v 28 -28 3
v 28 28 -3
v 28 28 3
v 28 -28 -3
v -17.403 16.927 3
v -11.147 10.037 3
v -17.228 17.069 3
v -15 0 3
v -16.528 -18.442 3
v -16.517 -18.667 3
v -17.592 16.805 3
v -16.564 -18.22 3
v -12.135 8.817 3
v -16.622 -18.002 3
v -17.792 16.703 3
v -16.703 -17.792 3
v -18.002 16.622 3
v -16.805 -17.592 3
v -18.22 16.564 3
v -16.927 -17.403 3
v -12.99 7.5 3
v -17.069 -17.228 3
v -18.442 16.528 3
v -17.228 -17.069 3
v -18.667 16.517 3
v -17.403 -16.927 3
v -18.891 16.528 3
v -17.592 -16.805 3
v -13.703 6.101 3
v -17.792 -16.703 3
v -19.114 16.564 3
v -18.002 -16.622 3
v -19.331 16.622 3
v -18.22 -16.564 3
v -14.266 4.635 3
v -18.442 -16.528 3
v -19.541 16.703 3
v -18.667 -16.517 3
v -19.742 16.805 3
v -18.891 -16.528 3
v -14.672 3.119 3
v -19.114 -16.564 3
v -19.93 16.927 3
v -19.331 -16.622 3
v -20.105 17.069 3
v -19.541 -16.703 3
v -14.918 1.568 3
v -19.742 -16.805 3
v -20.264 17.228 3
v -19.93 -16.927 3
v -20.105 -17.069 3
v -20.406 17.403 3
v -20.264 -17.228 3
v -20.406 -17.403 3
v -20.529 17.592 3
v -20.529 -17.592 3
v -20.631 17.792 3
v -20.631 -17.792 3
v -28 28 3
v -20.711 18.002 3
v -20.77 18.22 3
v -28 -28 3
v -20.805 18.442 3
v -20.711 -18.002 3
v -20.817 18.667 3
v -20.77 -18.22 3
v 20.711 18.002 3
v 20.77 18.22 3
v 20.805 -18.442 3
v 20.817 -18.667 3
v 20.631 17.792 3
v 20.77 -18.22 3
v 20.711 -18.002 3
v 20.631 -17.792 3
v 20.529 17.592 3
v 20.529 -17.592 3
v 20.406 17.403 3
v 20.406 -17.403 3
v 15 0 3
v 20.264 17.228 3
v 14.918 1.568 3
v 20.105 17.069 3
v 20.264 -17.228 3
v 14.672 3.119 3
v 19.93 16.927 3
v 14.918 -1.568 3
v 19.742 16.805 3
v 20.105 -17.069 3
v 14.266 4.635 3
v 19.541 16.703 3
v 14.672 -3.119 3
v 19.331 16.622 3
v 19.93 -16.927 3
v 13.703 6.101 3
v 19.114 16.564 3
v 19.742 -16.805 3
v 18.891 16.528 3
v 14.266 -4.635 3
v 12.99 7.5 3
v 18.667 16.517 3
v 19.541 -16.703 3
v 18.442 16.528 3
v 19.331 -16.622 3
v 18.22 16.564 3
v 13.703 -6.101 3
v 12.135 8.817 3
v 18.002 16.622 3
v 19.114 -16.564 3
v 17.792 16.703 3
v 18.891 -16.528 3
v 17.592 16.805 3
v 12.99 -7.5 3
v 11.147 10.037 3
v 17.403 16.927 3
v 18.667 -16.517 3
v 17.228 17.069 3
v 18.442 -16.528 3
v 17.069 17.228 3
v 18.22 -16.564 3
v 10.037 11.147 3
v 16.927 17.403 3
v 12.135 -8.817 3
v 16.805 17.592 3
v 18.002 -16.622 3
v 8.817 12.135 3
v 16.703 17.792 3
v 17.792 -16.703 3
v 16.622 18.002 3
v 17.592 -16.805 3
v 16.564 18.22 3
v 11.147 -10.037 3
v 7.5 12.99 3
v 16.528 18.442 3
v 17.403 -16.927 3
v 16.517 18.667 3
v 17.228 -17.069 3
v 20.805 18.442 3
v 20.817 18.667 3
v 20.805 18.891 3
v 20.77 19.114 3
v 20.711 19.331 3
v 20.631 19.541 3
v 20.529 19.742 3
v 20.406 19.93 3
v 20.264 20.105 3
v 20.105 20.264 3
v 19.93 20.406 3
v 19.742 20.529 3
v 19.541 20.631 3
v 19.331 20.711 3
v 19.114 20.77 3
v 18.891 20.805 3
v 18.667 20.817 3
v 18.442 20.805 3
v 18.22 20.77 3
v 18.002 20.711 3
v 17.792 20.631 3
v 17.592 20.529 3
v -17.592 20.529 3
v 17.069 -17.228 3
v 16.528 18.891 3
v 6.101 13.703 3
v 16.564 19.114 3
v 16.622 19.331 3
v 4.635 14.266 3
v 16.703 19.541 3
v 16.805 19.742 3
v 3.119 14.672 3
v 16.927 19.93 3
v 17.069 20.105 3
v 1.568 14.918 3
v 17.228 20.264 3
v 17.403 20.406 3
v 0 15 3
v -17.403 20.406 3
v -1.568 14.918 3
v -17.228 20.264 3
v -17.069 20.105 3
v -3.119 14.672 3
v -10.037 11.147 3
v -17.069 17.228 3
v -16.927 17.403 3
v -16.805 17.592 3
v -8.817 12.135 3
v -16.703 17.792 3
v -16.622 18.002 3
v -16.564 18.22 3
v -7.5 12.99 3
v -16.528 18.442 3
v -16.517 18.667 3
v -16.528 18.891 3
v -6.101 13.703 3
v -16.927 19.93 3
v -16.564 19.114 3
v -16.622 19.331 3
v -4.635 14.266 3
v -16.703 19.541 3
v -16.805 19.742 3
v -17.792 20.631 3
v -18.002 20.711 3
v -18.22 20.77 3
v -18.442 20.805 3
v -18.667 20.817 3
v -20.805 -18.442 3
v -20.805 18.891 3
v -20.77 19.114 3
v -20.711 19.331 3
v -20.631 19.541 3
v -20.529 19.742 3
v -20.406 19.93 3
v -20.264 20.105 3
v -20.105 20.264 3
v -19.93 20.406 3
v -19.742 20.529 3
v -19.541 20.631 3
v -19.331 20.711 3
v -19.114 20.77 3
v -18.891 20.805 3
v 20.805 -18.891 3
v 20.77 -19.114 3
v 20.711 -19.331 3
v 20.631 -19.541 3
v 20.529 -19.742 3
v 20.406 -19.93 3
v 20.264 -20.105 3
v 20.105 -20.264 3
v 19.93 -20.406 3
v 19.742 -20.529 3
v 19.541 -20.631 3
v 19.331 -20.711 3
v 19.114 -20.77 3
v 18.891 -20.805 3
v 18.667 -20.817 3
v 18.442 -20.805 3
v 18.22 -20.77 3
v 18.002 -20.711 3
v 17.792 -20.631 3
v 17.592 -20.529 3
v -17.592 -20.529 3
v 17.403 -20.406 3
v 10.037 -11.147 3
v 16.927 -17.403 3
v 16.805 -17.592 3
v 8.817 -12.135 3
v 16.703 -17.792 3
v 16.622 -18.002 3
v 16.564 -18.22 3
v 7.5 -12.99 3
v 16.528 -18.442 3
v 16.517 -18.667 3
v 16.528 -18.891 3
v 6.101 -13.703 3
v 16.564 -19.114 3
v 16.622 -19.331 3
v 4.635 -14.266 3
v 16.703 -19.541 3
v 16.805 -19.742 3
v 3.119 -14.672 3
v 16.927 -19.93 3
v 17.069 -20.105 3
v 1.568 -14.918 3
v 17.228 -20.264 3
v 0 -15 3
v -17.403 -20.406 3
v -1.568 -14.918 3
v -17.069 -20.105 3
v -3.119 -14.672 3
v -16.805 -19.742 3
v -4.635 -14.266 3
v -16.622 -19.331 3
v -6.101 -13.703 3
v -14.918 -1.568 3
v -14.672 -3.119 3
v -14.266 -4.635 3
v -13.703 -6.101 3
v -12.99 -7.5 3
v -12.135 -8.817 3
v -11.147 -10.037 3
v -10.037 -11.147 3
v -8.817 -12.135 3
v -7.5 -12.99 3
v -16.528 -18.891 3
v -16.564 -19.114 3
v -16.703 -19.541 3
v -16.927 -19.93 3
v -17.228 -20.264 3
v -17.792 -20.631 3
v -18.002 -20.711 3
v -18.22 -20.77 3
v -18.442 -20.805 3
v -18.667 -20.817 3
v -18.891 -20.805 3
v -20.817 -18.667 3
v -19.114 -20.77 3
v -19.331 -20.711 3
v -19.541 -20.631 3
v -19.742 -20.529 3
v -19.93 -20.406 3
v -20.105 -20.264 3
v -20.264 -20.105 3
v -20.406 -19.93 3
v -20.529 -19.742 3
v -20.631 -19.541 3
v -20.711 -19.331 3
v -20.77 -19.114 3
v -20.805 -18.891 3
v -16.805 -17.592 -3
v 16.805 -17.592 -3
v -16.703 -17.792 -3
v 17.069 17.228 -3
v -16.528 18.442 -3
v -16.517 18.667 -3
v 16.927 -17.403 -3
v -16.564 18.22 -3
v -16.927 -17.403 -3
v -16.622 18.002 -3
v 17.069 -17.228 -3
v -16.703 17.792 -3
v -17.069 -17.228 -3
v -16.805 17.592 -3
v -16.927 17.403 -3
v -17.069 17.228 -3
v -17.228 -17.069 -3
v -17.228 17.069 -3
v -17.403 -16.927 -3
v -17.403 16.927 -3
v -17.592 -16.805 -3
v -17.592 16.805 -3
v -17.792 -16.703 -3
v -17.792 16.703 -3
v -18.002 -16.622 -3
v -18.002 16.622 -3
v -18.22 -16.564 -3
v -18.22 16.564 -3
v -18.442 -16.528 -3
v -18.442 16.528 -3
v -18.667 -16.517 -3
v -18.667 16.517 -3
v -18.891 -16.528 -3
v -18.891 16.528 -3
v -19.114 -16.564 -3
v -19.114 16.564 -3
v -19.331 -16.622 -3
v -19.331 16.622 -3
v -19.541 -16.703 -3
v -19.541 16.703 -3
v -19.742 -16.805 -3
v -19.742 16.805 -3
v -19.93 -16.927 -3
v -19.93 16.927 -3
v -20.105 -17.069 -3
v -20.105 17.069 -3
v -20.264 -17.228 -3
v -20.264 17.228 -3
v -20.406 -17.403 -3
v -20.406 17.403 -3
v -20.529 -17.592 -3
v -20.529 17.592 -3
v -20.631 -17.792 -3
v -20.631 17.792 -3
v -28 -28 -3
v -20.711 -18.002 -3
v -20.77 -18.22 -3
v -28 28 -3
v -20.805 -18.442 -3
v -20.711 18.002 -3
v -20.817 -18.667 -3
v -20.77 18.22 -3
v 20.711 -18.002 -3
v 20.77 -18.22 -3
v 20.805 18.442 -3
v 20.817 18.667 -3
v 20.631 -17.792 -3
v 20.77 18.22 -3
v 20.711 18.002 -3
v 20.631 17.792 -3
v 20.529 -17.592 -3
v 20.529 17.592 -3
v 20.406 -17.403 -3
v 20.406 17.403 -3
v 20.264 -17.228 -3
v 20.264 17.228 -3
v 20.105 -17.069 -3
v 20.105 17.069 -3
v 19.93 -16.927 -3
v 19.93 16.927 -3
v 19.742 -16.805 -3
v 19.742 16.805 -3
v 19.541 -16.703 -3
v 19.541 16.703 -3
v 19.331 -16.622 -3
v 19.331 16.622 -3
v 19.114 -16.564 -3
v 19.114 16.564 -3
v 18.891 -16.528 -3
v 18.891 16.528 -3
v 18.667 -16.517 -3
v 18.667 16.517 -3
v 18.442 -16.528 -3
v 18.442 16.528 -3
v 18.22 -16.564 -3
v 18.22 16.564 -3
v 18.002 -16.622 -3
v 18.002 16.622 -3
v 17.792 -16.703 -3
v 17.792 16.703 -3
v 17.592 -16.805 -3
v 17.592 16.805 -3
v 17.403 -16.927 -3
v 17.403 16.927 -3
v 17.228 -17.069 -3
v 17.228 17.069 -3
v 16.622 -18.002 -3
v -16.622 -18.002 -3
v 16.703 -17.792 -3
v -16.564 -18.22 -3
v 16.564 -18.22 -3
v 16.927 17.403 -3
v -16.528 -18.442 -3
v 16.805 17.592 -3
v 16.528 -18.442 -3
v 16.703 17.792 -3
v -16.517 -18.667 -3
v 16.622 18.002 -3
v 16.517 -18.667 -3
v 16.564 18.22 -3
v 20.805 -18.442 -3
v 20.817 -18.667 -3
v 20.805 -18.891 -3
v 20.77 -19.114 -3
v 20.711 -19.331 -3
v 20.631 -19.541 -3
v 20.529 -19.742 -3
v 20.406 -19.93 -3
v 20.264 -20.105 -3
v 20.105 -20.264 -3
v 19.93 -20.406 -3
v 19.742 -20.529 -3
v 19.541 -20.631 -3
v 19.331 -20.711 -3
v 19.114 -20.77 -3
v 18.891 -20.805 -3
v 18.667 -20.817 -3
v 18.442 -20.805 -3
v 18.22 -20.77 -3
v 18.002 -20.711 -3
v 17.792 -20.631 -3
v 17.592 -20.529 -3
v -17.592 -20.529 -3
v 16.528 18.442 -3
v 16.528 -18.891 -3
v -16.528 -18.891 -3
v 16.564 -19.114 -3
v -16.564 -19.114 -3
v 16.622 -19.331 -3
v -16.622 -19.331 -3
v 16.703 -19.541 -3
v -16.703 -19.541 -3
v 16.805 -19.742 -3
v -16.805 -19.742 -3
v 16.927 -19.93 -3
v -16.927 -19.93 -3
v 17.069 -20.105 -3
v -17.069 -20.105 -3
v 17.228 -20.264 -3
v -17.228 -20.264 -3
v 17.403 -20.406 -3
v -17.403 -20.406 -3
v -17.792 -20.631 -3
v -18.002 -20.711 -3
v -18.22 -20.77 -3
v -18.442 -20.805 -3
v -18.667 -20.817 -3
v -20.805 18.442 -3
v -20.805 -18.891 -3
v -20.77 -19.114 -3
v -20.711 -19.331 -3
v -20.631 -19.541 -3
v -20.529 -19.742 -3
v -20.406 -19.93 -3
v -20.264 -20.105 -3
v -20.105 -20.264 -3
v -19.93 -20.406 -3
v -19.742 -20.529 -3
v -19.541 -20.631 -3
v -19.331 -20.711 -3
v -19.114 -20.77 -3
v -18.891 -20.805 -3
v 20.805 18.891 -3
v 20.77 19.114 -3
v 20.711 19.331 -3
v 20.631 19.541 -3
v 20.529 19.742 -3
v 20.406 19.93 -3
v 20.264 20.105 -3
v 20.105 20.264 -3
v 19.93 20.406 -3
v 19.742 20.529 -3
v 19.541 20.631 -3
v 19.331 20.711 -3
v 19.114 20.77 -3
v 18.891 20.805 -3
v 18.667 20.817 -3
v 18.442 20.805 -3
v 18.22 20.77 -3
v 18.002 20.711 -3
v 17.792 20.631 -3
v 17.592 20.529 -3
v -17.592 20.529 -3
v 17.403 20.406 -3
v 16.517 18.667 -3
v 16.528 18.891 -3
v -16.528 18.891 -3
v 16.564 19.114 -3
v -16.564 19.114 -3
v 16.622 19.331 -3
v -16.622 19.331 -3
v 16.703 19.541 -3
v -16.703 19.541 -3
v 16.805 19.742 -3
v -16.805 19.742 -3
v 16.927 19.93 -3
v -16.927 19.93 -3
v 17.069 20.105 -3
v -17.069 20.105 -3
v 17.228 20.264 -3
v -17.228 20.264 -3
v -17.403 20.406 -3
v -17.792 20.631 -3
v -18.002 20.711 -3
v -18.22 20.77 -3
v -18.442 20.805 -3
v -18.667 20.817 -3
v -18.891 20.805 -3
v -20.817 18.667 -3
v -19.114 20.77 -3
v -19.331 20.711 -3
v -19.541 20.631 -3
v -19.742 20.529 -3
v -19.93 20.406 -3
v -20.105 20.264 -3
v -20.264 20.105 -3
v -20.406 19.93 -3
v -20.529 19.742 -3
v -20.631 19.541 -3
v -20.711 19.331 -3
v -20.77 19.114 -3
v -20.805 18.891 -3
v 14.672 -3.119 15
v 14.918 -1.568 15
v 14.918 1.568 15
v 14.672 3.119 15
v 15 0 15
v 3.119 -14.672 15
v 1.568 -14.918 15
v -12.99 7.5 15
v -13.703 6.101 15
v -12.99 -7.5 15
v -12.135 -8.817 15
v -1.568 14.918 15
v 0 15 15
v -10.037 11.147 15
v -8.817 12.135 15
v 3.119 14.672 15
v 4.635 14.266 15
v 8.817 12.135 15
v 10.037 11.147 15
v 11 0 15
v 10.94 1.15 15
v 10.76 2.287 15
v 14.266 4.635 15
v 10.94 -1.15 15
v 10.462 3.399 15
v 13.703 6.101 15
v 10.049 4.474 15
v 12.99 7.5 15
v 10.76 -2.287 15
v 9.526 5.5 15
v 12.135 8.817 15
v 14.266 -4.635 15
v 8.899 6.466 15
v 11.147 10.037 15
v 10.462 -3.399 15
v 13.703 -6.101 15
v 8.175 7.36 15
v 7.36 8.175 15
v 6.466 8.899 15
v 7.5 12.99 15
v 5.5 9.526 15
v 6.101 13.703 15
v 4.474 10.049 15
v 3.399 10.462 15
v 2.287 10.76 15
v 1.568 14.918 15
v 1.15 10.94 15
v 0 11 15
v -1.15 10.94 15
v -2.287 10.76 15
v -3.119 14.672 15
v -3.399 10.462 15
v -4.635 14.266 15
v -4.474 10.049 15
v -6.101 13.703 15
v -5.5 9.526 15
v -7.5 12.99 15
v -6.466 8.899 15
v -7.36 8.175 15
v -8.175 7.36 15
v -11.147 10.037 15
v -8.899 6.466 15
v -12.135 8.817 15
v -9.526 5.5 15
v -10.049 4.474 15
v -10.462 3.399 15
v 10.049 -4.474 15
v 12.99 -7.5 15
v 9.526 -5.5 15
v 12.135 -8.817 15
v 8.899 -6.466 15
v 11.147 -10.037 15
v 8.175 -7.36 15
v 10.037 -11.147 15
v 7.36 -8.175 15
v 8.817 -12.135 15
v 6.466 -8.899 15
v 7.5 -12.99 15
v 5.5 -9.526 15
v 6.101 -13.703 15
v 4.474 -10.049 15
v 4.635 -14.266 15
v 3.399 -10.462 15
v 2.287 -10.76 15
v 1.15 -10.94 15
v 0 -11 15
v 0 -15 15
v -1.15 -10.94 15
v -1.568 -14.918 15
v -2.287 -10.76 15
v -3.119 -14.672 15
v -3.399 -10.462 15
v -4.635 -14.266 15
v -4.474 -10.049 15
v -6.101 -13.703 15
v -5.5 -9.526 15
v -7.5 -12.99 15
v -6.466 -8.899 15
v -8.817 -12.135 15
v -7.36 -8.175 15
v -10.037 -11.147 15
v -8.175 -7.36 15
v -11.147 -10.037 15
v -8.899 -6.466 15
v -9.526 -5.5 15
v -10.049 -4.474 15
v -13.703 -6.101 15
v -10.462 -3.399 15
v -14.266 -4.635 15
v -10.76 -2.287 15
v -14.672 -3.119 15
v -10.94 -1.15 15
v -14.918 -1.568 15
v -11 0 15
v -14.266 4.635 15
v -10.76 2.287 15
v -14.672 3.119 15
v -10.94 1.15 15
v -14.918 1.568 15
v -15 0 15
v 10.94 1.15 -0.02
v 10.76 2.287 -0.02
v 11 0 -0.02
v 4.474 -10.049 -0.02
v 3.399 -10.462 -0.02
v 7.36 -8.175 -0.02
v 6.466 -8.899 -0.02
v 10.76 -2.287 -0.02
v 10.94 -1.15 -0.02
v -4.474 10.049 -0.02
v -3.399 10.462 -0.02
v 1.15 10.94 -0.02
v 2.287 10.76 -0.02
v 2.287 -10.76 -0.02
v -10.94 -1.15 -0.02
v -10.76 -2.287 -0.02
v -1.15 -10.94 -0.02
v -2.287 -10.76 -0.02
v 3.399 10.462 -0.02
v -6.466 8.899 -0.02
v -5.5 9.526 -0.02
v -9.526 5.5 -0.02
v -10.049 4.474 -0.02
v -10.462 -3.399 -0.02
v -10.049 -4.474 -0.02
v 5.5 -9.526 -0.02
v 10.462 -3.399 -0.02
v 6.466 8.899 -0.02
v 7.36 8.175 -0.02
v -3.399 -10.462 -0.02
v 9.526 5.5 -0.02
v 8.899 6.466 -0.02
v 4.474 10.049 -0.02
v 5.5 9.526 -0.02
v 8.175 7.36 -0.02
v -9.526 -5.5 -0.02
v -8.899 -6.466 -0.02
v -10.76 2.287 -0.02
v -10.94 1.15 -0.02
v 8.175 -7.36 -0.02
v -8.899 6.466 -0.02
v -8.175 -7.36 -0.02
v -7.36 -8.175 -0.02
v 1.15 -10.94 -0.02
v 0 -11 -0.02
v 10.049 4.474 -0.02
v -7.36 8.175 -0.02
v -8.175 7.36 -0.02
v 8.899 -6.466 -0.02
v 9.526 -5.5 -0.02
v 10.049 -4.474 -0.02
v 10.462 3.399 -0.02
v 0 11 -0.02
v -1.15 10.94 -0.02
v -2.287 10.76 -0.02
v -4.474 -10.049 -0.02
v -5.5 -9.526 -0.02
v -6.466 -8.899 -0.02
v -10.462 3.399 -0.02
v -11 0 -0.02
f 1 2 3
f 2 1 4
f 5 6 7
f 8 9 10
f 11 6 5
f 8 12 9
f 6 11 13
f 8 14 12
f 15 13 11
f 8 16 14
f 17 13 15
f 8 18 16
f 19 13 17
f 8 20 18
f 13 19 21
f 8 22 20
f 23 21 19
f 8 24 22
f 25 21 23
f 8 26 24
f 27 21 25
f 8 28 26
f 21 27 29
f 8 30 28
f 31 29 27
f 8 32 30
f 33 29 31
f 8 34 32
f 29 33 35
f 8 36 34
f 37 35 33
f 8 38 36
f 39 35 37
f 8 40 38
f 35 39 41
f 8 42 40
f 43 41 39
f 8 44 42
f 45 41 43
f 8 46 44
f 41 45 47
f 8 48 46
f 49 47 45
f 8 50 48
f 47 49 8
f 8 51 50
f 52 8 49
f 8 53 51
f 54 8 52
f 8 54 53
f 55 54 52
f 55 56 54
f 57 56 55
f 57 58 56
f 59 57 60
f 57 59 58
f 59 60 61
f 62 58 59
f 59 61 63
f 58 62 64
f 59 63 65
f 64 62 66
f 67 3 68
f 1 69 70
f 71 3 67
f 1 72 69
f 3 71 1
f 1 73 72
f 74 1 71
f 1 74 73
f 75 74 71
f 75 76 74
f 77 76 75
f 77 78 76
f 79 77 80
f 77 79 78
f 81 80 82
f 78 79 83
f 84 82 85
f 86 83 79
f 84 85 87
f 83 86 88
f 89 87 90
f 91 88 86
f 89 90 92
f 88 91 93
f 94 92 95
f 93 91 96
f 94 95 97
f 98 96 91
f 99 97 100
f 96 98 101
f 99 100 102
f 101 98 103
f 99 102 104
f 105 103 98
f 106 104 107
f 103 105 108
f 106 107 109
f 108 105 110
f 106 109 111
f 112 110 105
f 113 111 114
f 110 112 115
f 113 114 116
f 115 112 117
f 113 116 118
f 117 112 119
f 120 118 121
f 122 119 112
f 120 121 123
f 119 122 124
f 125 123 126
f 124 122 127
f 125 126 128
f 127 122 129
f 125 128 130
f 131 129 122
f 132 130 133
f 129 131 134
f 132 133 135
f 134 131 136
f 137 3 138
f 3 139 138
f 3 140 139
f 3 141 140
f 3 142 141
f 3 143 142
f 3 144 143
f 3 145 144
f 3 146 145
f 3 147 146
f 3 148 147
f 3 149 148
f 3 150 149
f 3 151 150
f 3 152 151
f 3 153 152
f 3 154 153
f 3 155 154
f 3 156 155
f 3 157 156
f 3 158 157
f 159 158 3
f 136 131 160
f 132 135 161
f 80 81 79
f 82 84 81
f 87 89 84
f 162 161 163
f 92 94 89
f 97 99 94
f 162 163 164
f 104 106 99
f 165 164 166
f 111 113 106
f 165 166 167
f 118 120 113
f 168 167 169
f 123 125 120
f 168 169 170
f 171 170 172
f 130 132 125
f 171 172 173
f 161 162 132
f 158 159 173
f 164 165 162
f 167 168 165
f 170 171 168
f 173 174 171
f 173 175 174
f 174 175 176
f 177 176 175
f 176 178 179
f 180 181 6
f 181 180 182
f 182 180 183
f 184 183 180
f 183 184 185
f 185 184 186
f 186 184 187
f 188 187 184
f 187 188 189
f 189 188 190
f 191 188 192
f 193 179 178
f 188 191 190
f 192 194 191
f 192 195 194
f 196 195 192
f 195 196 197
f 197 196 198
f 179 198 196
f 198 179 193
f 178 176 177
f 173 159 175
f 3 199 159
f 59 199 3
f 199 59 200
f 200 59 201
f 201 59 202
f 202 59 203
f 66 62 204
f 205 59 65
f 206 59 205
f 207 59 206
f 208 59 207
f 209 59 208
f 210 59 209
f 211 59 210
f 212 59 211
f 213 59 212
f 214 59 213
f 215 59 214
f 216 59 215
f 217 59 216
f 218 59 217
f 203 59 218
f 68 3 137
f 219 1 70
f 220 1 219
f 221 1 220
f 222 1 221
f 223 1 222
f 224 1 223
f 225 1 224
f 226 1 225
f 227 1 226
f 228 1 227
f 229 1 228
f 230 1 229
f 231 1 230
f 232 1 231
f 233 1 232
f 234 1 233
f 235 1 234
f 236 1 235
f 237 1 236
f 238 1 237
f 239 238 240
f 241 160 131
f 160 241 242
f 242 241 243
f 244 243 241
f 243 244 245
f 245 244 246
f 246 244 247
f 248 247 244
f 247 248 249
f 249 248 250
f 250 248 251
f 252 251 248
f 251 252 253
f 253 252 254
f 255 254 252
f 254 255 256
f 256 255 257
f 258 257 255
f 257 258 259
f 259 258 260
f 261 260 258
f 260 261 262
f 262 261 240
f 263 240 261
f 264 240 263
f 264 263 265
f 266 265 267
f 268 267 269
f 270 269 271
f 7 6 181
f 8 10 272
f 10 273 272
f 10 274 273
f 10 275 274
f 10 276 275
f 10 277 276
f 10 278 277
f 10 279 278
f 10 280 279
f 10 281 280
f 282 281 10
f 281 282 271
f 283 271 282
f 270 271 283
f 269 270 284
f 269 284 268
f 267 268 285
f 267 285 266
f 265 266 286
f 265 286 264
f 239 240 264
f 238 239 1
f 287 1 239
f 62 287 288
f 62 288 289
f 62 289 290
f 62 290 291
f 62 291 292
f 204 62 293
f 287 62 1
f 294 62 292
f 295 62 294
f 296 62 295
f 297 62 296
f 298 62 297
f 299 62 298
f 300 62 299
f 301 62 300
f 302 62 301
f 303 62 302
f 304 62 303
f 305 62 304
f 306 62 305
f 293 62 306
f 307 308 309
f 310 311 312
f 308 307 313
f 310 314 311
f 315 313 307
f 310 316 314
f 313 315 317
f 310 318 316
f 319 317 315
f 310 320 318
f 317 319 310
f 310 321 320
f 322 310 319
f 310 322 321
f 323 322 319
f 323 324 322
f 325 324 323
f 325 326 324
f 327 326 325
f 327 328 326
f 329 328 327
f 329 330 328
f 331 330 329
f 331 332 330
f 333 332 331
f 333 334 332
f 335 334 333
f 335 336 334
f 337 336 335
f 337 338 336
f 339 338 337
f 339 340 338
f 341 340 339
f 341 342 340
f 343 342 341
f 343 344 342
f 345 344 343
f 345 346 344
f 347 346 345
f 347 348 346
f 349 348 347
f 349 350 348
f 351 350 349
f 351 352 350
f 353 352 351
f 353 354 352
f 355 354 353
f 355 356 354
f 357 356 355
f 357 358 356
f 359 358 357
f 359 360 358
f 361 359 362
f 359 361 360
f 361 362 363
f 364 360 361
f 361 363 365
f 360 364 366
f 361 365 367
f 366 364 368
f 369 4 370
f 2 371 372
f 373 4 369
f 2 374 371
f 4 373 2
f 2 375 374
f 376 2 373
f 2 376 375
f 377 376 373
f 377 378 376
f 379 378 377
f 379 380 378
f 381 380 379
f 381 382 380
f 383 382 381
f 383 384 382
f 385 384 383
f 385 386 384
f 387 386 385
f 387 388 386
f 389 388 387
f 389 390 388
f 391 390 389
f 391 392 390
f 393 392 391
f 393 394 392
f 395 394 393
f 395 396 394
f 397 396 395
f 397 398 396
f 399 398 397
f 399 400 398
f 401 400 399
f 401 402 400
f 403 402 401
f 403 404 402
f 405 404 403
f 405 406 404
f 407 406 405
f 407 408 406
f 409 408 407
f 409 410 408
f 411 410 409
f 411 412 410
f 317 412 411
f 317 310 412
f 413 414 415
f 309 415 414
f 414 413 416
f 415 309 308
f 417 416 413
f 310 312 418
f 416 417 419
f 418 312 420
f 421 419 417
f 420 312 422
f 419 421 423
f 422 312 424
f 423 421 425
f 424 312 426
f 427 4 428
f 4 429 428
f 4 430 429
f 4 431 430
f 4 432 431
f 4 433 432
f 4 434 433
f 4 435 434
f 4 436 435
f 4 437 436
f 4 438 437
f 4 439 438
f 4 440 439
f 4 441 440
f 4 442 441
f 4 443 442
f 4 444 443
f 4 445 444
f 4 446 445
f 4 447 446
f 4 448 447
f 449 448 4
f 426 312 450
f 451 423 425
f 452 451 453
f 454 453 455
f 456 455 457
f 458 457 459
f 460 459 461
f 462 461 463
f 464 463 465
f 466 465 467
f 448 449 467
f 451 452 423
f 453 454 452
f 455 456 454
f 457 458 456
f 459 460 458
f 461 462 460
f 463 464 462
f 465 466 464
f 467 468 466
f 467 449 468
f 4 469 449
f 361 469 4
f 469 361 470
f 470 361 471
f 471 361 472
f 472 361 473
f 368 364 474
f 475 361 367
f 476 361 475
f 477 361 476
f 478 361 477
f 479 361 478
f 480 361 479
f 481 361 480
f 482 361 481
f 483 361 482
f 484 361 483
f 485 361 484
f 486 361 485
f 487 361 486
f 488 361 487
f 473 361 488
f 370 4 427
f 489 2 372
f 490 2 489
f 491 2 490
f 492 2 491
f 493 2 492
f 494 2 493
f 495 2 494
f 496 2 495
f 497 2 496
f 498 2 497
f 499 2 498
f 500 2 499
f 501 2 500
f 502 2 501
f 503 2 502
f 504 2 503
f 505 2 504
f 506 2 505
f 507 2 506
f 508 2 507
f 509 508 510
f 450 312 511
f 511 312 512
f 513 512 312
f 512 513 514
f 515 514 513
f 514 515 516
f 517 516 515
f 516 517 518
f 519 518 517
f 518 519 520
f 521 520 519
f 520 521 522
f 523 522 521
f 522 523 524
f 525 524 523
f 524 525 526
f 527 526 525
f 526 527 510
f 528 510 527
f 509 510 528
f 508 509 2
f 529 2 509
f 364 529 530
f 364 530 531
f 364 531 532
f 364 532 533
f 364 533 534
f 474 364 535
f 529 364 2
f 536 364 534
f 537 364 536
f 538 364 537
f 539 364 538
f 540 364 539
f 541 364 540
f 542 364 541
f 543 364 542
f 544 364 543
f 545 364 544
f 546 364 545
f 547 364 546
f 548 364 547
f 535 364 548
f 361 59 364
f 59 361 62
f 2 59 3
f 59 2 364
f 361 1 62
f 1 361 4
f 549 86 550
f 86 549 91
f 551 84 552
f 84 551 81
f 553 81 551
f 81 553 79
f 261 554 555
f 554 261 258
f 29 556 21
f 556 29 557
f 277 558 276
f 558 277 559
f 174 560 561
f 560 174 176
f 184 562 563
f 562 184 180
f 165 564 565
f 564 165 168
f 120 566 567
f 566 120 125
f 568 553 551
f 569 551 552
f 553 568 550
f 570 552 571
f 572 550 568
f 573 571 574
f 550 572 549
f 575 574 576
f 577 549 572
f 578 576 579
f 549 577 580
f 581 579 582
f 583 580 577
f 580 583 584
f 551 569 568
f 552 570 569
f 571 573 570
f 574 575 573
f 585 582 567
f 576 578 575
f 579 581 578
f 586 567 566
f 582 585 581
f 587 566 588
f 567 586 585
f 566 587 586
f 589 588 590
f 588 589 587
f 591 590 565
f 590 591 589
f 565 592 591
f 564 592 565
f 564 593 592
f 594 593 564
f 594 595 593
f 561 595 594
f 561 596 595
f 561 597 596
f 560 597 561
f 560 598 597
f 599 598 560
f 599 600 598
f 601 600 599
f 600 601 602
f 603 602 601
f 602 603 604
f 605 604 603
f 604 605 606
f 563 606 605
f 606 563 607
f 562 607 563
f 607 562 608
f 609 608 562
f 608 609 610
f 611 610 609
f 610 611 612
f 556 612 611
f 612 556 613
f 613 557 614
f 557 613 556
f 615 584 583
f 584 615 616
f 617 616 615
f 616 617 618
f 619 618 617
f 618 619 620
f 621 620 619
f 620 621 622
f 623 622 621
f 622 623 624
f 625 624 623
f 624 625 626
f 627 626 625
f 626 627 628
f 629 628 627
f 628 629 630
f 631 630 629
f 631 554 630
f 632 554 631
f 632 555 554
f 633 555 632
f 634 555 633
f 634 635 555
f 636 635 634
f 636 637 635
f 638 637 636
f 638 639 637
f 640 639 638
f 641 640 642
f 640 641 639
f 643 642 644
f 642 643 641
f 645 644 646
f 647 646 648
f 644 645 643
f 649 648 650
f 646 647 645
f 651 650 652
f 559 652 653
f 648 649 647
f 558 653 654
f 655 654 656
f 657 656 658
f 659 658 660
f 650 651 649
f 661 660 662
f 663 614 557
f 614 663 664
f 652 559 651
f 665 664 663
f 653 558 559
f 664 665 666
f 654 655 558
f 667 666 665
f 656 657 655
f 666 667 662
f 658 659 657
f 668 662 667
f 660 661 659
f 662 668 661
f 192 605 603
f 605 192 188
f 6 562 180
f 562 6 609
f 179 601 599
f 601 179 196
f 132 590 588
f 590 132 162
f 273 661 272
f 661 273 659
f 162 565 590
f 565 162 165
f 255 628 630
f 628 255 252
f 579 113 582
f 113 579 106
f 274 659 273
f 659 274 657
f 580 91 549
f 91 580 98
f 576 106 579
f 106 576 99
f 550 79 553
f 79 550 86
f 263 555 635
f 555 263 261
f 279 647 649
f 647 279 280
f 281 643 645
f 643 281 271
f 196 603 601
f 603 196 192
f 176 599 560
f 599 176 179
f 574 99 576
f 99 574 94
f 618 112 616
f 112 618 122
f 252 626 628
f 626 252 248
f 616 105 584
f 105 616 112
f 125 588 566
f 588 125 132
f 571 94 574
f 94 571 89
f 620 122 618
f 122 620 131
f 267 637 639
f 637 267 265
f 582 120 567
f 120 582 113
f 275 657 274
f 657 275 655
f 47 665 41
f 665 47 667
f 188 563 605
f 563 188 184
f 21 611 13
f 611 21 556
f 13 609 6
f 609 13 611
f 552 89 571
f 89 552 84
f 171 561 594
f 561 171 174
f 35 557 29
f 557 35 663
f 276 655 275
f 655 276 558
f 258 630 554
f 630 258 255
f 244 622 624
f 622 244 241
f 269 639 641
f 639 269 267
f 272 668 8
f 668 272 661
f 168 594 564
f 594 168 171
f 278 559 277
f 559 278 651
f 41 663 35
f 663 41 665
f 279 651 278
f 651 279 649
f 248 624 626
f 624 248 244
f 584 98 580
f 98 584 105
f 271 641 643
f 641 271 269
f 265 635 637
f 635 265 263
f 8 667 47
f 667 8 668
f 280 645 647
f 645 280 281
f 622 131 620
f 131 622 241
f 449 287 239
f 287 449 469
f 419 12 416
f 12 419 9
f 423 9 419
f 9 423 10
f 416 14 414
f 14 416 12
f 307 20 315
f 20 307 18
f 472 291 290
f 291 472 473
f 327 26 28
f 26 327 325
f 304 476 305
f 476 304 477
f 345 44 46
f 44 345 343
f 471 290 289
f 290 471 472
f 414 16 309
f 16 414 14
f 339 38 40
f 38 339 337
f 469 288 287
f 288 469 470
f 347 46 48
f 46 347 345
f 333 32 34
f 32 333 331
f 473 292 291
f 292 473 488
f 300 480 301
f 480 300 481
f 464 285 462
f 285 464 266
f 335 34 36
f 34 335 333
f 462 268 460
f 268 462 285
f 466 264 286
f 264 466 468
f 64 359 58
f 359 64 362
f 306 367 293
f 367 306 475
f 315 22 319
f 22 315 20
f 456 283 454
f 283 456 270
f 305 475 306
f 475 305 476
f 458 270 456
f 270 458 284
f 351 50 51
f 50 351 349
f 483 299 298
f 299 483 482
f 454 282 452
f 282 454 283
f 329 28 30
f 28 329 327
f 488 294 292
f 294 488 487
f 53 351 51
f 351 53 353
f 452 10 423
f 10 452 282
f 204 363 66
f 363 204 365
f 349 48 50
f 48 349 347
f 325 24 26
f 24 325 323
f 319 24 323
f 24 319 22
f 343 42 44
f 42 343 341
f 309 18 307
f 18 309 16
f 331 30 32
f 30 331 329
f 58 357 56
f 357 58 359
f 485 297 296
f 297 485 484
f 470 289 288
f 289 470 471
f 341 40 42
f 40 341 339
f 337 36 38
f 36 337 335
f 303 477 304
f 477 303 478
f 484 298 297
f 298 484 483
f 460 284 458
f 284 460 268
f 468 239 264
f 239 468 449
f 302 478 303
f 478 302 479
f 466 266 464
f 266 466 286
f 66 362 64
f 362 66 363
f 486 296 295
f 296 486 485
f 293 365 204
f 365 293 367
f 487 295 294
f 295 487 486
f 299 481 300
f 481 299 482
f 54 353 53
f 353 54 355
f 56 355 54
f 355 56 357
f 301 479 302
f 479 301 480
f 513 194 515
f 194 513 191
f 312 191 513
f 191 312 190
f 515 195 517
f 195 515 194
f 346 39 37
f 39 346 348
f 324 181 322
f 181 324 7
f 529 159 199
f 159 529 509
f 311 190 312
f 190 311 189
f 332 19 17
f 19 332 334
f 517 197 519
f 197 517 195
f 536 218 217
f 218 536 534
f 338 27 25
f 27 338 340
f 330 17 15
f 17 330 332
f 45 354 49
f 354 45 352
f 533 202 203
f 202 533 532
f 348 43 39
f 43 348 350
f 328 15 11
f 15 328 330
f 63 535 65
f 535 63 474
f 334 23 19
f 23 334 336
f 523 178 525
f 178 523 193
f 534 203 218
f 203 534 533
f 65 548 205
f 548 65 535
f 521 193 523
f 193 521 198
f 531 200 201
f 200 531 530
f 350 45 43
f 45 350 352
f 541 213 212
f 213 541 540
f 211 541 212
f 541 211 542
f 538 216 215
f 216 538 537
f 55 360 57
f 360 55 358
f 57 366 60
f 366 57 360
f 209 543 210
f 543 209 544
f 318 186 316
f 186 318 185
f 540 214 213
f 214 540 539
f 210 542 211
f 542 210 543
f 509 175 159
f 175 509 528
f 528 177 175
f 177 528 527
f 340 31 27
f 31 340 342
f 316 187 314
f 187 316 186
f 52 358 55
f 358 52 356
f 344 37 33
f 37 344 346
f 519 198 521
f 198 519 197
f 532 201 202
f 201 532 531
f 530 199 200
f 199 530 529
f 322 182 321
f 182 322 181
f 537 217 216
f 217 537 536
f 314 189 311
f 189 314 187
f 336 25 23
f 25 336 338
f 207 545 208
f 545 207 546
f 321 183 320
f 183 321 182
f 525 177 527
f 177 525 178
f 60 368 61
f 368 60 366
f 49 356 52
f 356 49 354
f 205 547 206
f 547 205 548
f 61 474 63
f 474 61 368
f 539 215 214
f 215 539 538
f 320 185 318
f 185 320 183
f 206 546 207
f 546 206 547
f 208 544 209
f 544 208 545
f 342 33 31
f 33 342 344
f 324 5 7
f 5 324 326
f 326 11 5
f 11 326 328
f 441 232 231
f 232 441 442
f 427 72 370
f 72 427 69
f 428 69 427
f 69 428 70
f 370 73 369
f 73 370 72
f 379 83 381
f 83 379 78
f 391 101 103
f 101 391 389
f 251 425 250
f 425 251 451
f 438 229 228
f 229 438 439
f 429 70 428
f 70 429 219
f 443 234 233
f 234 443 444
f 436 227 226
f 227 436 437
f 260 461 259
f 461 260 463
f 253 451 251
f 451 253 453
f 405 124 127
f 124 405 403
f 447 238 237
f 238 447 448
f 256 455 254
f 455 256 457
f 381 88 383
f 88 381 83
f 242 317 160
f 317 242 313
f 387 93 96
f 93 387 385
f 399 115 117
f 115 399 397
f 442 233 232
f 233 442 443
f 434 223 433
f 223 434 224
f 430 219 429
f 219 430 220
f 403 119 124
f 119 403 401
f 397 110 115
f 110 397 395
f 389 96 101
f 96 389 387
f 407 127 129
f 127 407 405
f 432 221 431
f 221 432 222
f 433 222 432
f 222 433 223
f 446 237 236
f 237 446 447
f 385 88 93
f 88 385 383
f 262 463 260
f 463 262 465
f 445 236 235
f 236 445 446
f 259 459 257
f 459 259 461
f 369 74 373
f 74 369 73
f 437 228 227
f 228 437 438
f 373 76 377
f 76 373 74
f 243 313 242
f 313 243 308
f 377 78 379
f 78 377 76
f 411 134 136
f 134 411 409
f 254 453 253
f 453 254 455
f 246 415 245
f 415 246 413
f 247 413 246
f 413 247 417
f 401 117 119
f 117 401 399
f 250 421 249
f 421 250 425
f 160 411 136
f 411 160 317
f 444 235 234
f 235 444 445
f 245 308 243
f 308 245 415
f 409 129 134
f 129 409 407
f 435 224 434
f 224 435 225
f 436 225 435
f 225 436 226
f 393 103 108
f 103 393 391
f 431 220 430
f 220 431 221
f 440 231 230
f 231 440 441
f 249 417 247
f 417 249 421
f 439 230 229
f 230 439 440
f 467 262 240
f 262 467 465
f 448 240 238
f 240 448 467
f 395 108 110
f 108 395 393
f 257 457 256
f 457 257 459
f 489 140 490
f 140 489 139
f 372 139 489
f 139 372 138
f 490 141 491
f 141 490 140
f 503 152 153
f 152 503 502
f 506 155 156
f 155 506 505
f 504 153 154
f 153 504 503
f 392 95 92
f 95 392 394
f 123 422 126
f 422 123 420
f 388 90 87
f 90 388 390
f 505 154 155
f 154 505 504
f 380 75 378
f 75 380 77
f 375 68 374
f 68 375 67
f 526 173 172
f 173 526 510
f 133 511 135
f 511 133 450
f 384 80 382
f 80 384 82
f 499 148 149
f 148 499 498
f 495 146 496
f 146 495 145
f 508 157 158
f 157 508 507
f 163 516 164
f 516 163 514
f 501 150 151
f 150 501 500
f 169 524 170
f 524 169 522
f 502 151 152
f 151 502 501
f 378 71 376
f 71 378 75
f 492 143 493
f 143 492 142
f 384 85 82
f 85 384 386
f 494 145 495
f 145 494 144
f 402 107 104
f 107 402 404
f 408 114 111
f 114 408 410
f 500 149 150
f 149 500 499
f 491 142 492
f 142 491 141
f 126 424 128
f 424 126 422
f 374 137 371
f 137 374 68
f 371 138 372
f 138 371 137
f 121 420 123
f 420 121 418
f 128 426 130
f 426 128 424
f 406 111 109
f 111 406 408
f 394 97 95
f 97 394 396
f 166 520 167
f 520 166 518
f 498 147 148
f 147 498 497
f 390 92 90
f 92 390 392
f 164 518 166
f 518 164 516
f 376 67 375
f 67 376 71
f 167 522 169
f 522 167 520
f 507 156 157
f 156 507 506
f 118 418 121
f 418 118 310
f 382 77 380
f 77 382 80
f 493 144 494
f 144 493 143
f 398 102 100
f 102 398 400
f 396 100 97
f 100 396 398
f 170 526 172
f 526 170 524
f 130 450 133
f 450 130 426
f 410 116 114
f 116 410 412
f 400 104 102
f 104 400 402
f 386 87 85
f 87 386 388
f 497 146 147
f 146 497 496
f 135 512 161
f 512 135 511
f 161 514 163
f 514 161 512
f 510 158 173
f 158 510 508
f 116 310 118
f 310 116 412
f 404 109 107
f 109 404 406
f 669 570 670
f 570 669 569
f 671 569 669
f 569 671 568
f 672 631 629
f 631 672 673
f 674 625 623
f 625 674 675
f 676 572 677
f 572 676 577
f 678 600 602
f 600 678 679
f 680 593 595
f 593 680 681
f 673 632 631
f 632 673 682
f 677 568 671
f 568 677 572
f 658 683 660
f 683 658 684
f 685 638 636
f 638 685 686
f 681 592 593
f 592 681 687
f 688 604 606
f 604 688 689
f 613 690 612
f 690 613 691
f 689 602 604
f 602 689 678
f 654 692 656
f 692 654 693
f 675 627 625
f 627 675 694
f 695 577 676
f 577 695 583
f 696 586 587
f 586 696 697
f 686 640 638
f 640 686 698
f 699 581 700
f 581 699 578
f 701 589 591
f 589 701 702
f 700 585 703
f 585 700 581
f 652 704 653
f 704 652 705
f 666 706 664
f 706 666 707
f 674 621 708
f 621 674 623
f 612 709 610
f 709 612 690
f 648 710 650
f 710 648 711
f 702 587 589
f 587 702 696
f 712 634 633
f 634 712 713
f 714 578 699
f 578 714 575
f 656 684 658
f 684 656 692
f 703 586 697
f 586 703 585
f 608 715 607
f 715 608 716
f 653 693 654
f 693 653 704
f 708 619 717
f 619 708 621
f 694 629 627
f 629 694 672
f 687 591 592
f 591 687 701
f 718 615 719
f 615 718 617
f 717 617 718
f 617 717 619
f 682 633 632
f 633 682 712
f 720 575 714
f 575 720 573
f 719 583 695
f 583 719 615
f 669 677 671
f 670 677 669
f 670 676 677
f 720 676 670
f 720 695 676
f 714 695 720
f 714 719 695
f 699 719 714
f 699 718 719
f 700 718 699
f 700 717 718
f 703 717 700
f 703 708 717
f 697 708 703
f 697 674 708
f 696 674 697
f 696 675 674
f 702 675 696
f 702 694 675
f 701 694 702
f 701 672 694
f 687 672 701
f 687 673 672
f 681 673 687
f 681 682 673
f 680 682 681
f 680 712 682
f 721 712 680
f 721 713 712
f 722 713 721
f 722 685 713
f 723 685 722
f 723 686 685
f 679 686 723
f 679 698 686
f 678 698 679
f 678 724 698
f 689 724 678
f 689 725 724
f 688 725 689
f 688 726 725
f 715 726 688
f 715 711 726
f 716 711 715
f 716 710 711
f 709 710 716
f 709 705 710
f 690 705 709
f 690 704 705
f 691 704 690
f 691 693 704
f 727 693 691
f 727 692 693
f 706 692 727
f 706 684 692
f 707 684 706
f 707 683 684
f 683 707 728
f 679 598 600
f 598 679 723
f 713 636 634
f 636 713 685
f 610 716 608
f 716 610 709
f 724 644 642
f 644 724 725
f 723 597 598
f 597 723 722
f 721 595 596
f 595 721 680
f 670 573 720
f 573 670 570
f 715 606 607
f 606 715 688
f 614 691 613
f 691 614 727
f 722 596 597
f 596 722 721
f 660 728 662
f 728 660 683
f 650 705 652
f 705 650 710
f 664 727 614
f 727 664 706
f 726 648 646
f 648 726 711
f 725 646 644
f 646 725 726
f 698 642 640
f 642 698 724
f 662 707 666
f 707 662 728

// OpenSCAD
// Flange bearing block for 22 mm bearing OD.
$fn = 60;
eps = 0.02;
bearing_d = 22;
plate_l = bearing_d + 34;
plate_t = 6;
hub_h = bearing_d / 2 + 4;
difference() {
    union() {
        cube([plate_l, plate_l, plate_t], center = true);
        cylinder(d = bearing_d + 8, h = hub_h);
    }
    translate([0, 0, -eps]) cylinder(d = bearing_d, h = hub_h + 2 * eps);
    for (x = [-plate_l / 3, plate_l / 3], y = [-plate_l / 3, plate_l / 3])
        translate([x, y, -plate_t / 2 - eps]) cylinder(d = 4.3, h = plate_t + 2 * eps);
}
